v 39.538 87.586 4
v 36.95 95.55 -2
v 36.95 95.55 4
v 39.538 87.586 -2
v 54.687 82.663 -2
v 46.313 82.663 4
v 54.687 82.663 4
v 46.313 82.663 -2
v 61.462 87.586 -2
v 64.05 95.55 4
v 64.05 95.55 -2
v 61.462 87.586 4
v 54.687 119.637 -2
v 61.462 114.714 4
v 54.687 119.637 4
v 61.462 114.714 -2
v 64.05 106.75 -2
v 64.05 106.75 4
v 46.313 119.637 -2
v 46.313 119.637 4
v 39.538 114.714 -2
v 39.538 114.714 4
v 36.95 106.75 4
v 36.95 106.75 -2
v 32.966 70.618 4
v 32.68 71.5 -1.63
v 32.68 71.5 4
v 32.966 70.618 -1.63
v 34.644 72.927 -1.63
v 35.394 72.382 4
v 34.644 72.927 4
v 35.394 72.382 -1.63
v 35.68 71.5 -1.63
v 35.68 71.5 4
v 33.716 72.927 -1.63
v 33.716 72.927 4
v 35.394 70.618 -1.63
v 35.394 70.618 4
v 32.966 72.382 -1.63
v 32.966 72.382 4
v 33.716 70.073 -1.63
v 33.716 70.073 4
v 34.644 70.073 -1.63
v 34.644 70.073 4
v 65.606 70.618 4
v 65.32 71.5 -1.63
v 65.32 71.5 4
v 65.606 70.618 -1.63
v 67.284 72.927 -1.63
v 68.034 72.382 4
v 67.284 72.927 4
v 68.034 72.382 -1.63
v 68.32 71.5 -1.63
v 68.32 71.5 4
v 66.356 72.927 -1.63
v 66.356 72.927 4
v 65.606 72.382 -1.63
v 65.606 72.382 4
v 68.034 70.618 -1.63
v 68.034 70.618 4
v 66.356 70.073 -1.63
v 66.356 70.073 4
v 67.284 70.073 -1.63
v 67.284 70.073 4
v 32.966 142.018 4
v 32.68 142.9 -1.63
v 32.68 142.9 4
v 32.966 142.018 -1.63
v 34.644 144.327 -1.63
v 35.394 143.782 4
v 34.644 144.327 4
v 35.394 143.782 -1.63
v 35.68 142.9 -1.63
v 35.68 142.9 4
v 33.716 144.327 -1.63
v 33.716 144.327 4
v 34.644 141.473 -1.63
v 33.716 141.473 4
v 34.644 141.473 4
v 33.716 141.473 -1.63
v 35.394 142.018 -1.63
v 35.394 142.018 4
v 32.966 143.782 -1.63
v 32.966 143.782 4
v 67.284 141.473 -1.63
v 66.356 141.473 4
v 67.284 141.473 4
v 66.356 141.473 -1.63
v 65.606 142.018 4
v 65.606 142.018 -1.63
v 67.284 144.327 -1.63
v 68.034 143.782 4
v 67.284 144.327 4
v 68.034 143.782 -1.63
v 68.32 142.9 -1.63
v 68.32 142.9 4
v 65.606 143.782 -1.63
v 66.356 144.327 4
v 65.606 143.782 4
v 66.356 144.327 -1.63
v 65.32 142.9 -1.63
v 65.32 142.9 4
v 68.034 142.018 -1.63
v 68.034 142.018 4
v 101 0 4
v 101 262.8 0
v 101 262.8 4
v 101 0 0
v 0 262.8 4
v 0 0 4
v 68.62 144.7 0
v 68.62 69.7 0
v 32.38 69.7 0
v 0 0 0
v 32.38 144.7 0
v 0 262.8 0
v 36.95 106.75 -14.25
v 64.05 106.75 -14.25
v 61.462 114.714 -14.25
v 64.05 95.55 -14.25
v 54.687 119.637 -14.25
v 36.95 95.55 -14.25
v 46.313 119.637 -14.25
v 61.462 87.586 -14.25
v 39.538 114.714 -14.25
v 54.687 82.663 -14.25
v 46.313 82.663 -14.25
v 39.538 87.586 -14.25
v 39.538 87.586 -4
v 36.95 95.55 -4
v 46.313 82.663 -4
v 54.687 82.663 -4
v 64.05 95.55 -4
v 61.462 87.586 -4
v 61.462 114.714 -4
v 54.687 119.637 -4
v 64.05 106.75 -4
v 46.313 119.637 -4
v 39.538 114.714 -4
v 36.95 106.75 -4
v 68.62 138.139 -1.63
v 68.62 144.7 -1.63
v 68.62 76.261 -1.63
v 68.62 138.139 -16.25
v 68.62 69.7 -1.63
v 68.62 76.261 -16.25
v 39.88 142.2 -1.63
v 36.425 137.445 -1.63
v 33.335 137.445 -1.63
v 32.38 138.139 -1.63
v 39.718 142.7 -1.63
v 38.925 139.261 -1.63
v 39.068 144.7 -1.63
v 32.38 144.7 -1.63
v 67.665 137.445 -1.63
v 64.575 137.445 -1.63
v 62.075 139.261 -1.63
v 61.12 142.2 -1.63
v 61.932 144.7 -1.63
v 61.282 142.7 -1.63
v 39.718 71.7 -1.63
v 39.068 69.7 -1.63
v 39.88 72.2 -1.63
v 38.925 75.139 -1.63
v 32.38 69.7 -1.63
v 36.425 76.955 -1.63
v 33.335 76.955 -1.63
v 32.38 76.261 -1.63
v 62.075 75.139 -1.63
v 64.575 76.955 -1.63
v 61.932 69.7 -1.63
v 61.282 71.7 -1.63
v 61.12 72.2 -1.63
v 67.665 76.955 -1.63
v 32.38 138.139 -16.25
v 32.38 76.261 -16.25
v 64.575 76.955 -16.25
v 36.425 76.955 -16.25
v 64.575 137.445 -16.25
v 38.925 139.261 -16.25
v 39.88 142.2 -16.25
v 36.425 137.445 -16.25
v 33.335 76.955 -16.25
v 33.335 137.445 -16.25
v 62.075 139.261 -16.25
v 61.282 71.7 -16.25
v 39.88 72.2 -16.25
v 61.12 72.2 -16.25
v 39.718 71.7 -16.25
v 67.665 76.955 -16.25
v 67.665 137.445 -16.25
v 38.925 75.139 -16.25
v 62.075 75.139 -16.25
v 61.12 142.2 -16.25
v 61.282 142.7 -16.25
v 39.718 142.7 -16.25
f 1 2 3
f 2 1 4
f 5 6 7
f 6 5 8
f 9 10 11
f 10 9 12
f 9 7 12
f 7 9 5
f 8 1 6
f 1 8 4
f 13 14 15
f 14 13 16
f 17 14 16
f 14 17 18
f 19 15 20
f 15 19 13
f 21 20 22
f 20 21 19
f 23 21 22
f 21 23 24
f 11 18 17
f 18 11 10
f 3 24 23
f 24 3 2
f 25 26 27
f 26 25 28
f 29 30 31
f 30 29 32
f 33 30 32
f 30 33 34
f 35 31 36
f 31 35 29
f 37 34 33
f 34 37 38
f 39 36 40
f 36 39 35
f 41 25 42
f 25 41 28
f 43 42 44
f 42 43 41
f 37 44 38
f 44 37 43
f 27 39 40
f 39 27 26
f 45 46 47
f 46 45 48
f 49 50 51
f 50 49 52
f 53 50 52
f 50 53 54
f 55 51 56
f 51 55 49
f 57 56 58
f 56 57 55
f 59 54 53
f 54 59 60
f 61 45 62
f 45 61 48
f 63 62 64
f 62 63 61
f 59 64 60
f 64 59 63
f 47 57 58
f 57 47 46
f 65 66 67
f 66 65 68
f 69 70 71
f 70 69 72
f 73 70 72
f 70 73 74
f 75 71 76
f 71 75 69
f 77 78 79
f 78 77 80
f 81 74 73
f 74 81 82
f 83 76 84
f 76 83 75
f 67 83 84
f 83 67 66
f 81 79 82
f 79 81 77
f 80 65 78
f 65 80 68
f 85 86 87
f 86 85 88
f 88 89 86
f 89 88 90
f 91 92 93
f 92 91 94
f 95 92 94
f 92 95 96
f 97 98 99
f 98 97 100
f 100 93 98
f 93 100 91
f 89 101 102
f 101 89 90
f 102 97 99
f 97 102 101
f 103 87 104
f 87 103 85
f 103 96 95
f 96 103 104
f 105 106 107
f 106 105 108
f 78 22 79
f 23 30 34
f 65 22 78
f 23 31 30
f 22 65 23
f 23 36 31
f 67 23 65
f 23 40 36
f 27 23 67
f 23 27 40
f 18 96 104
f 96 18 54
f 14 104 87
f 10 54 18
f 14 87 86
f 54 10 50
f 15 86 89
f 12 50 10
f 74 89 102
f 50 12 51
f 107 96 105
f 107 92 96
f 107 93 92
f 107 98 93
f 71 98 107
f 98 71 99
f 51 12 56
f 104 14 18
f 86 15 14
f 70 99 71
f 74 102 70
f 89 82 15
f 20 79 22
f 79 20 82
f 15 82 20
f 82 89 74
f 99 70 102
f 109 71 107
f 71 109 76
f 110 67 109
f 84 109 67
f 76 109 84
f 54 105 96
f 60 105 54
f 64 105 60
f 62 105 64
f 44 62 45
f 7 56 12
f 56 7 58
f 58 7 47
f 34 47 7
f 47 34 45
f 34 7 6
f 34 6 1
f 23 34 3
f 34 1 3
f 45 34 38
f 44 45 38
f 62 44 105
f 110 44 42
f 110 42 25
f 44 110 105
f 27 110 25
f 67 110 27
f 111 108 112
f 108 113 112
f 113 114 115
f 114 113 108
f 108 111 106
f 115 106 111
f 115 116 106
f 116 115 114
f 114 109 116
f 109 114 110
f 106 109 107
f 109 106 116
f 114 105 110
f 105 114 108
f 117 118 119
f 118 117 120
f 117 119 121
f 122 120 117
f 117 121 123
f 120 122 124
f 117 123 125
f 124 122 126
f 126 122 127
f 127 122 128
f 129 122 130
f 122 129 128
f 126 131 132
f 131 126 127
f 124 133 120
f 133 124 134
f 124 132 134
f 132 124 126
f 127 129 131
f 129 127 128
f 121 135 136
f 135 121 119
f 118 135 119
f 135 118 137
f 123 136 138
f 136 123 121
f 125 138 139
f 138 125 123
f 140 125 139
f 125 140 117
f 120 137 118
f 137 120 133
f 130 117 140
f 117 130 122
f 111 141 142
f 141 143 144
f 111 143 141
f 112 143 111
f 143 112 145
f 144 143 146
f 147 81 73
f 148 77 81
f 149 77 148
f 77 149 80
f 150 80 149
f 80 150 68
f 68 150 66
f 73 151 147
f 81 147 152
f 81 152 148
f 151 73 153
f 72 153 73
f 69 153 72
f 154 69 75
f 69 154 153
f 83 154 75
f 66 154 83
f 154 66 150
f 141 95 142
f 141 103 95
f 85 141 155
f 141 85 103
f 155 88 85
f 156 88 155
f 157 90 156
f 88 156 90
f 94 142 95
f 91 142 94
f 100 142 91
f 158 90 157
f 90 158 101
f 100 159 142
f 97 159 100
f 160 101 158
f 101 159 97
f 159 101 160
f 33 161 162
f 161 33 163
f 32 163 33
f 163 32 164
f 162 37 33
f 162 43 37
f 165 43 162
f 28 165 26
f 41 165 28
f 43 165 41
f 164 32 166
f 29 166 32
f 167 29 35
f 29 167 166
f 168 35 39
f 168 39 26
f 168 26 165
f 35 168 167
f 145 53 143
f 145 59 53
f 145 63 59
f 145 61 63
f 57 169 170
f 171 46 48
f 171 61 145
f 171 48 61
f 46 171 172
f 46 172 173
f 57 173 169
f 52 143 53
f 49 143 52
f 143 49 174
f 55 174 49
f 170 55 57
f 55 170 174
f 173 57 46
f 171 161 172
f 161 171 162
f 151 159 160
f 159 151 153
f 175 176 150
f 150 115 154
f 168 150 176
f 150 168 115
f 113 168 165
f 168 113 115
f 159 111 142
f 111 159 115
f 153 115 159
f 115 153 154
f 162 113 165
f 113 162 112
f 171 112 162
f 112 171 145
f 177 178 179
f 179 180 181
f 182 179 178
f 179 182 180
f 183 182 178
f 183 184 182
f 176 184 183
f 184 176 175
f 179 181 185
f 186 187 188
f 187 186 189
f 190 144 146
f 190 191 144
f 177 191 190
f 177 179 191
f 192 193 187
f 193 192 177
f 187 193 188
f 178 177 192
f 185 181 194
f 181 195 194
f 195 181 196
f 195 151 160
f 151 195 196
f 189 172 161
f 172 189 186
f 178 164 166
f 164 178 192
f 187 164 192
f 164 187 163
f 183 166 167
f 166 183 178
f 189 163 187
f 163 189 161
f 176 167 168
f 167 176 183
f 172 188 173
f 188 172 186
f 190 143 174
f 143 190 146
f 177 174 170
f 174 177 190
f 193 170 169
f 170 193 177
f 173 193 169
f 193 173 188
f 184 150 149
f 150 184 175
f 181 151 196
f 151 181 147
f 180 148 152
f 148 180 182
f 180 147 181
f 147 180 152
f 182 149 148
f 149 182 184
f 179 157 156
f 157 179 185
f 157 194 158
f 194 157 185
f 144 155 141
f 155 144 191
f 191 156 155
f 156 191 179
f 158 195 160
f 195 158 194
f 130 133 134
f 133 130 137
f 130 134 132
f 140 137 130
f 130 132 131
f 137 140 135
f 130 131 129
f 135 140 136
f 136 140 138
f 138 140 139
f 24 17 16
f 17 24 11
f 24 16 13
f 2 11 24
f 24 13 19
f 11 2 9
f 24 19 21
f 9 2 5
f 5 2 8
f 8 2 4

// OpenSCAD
// file: logo_ia.scad
// Module names are of the form poly_<inkscape-path-id>().  As a result,
// you can associate a polygon in this OpenSCAD program with the corresponding
// SVG element in the Inkscape document by looking for the XML element with
// the attribute id="inkscape-path-id".

// fudge value is used to ensure that subtracted solids are a tad taller
// in the z dimension than the polygon being subtracted from.  This helps
// keep the resulting .stl file manifold.
fudge = 0.1;

module logo_ia(h) {
	l_ia_poly_path2258(1);
	l_ia_poly_rect2221(1);
	l_ia_poly_path2256(1);
}

module l_ia_poly_path2258(h)
{
  scale([25.4/90, -25.4/90, 1]) union()
  {
    linear_extrude(height=h)
      polygon([[-348.343370,-299.999997],[-429.329816,-151.807228],[47.100903,-151.807228],[48.804186,-155.933918],[50.655575,-159.981314],[52.651679,-163.946025],[54.789107,-167.824659],[57.064467,-171.613824],[59.474369,-175.310131],[62.015420,-178.910187],[64.684229,-182.410601],[67.477406,-185.807982],[70.391557,-189.098939],[73.423293,-192.280080],[76.569221,-195.348015],[79.825951,-198.299352],[83.190090,-201.130700],[86.658248,-203.838668],[90.227032,-206.419864],[93.893053,-208.870898],[97.652917,-211.188377],[101.503235,-213.368912],[105.440613,-215.409109],[109.461662,-217.305580],[113.562990,-219.054931],[117.741204,-220.653773],[121.992915,-222.098713],[126.314730,-223.386361],[130.703258,-224.513324],[135.155107,-225.476213],[139.666887,-226.271636],[144.235206,-226.896202],[148.856672,-227.346518],[153.527894,-227.619195],[158.245481,-227.710841],[162.963070,-227.619199],[167.634295,-227.346524],[172.255764,-226.896210],[176.824084,-226.271647],[181.335866,-225.476225],[185.787717,-224.513338],[190.176246,-223.386375],[194.498061,-222.098728],[198.749772,-220.653788],[202.927987,-219.054947],[207.029315,-217.305596],[211.050363,-215.409125],[214.987742,-213.368927],[218.838059,-211.188392],[222.597923,-208.870912],[226.263942,-206.419878],[229.832726,-203.838681],[233.300883,-201.130712],[236.665021,-198.299363],[239.921749,-195.348025],[243.067677,-192.280089],[246.099411,-189.098946],[249.013562,-185.807988],[251.806737,-182.410606],[254.475545,-178.910191],[257.016595,-175.310134],[259.426496,-171.613827],[261.701856,-167.824660],[263.839283,-163.946026],[265.835387,-159.981315],[267.686776,-155.933918],[269.390058,-151.807228],[429.216864,-151.807228],[348.230419,-299.999997],[-348.343370,-299.999997]]);
  }
}

module l_ia_poly_rect2221(h)
{
  scale([25.4/90, -25.4/90, 1]) union()
  {
    linear_extrude(height=h)
      polygon([[-595.368971,151.807228],[-676.468368,299.999997],[676.468368,299.999997],[595.368971,151.807228],[-595.368971,151.807228]]);
  }
}

module l_ia_poly_path2256(h)
{
  scale([25.4/90, -25.4/90, 1]) union()
  {
    linear_extrude(height=h)
      polygon([[-476.769574,-65.060240],[-557.868971,83.132529],[557.756019,83.132529],[476.769574,-65.060240],[269.390058,-65.060240],[267.686772,-60.933553],[265.835381,-56.886160],[263.839274,-52.921451],[261.701844,-49.042820],[259.426482,-45.253656],[257.016579,-41.557351],[254.475527,-37.957296],[251.806716,-34.456883],[249.013540,-31.059502],[246.099388,-27.768545],[243.067652,-24.587404],[239.921724,-21.519469],[236.664995,-18.568131],[233.300856,-15.736783],[229.832699,-13.028814],[226.263915,-10.447617],[222.597896,-7.996583],[218.838032,-5.679103],[214.987716,-3.498567],[211.050338,-1.458368],[207.029290,0.438103],[202.927964,2.187456],[198.749750,3.786299],[194.498041,5.231240],[190.176227,6.518888],[185.787700,7.645853],[181.335851,8.608743],[176.824072,9.404167],[172.255754,10.028733],[167.634289,10.479050],[162.963067,10.751727],[158.245481,10.843373],[153.527897,10.751724],[148.856678,10.479044],[144.235214,10.028724],[139.666898,9.404156],[135.155119,8.608731],[130.703271,7.645840],[126.314744,6.518874],[121.992930,5.231225],[117.741220,3.786283],[113.563006,2.187440],[109.461678,0.438087],[105.440629,-1.458384],[101.503250,-3.498583],[97.652932,-5.679118],[93.893067,-7.996597],[90.227046,-10.447631],[86.658260,-13.028827],[83.190102,-15.736794],[79.825961,-18.568142],[76.569231,-21.519478],[73.423301,-24.587412],[70.391565,-27.768553],[67.477412,-31.059508],[64.684235,-34.456888],[62.015424,-37.957300],[59.474372,-41.557354],[57.064470,-45.253658],[54.789108,-49.042821],[52.651680,-52.921452],[50.655575,-56.886160],[48.804186,-60.933553],[47.100903,-65.060240],[-476.769574,-65.060240]]);
  }
}

logo_ia(1);
// file: haut_parleur_HP8R.scad
include <parametre.scad>

// pour exporter en .dxf
//projection(cut = false) 
haut_parleur_HP8R();

module haut_parleur_HP8R() {
	union() {
		difference() {
			color([0.7, 0.7, 0.7])
			union() {
				// la plaque de fixation
				cube(size=[HP8R_largeur, HP8R_hauteur, HP8R_epaisseur_tole]);
				// le caisson
				translate([0, (HP8R_hauteur - HP8R_hauteur_caisson) / 2, 0])
					cube(size=[HP8R_largeur, HP8R_hauteur_caisson, HP8R_epaisseur_totale]);
			}
			
			// on fait des trous :)

			// les 4 coins
			translate([HP8R_diametre_creuse_coins / 4, HP8R_diametre_creuse_coins / 4, HP8R_epaisseur_tole])
				cylinder(HP8R_epaisseur_totale + difference_objet_marge, d=HP8R_diametre_creuse_coins, $fn=resolution);
			translate([HP8R_largeur - HP8R_diametre_creuse_coins / 2 + HP8R_diametre_creuse_coins / 4, HP8R_diametre_creuse_coins / 4, HP8R_epaisseur_tole])
				cylinder(HP8R_epaisseur_totale + difference_objet_marge, d=HP8R_diametre_creuse_coins, $fn=resolution);
			translate([HP8R_diametre_creuse_coins / 4, HP8R_hauteur - HP8R_diametre_creuse_coins / 2 + HP8R_diametre_creuse_coins / 4, HP8R_epaisseur_tole])
				cylinder(HP8R_epaisseur_totale + difference_objet_marge, d=HP8R_diametre_creuse_coins, $fn=resolution);
			translate([HP8R_largeur - HP8R_diametre_creuse_coins / 2 + HP8R_diametre_creuse_coins / 4, HP8R_hauteur - HP8R_diametre_creuse_coins / 2 + HP8R_diametre_creuse_coins / 4, HP8R_epaisseur_tole])
				cylinder(HP8R_epaisseur_totale + difference_objet_marge, d=HP8R_diametre_creuse_coins, $fn=resolution);

			haut_parleur_HP8R_trous();
		}
		
		// on ajoute la membrane de l'enceinte
		haut_parleur_HP8R_membrane();
	}
}

module haut_parleur_HP8R_membrane() {
	color([0.5, 0.5, 0.5])
		translate([HP8R_largeur / 2 - HP8R_largeur_trou / 2, HP8R_decalage_hauteur_trou, 2]) 
			cube(size=[HP8R_largeur_trou, HP8R_largeur_trou * 2, 2]);
}

module haut_parleur_HP8R_trouHP() {
	union() {
		// arrondi HP
		translate([HP8R_largeur / 2, HP8R_decalage_hauteur_trou + HP8R_largeur_trou / 2, -difference_objet_marge])
			cylinder(HP8R_epaisseur_trou + difference_objet_marge, d=HP8R_largeur_trou, $fn=resolution);
		translate([HP8R_largeur / 2, HP8R_decalage_hauteur_trou + HP8R_hauteur_trou - HP8R_largeur_trou / 2, -difference_objet_marge])
			cylinder(HP8R_epaisseur_trou + difference_objet_marge, d=HP8R_largeur_trou, $fn=resolution);

		// le trou HP
		translate([(HP8R_largeur - HP8R_largeur_trou) / 2, HP8R_decalage_hauteur_trou + HP8R_largeur_trou / 2, -difference_objet_marge])
				cube(size=[HP8R_largeur_trou, HP8R_hauteur_trou - HP8R_largeur_trou, HP8R_epaisseur_trou + difference_objet_marge]);
	}
}

module haut_parleur_HP8R_trousFixation() {
	// les 4 trous pour fixation
	translate([HP8R_marge_creuse_fixation, HP8R_marge_creuse_fixation, -difference_objet_marge/2])
		cylinder(HP8R_epaisseur_tole + difference_objet_marge, d=HP8R_diametre_creuse_fixation, $fn=resolution);
	translate([HP8R_largeur - HP8R_marge_creuse_fixation, HP8R_marge_creuse_fixation, -difference_objet_marge/2])
		cylinder(HP8R_epaisseur_tole + difference_objet_marge, d=HP8R_diametre_creuse_fixation, $fn=resolution);
	translate([HP8R_marge_creuse_fixation, HP8R_hauteur - HP8R_marge_creuse_fixation, -difference_objet_marge/2])
		cylinder(HP8R_epaisseur_tole + difference_objet_marge, d=HP8R_diametre_creuse_fixation, $fn=resolution);
	translate([HP8R_largeur - HP8R_marge_creuse_fixation, HP8R_hauteur - HP8R_marge_creuse_fixation, -difference_objet_marge/2])
		cylinder(HP8R_epaisseur_tole + difference_objet_marge, d=HP8R_diametre_creuse_fixation, $fn=resolution);
}

module haut_parleur_HP8R_trous() {
	haut_parleur_HP8R_trouHP();
	haut_parleur_HP8R_trousFixation();
}
// file: parametre.scad
/* pour le rendu openscad */

// pour la finesse de rendu
// plus c'est élevé, mieux c'est... mais ça prend plus de temps et de ressource
resolution = 10;

// pour export DXF
show_mode_projection = 0;

// pour enlever de la matière des objets dans openscad et être certain qu'il ne reste pas un bout de face
difference_objet_marge = 20;

// pour afficher (1) ou pas (0) les accessoires installés
show_accessoires = 1;

show_incrustations = 0;

show_logo_r2builders = 0;



/* pour le design du jeu  */

// tout est en millimetre !!!!

// configuration globale
////////////////////////

// quand on perce et que l'on va insérer quelque chose dedans...
// il faut un peu de vide en plus ;)
padding_percage = 0.2;

// espace supplémentaire pour la largeur de rainure
padding_rainure = 0; // 1

// profondeur standard pour une rainure
profondeur_rainure = 0; // 2 // moins que epaisseur_tole_grille_led et que epaisseur_tole_grille_led ! Il faut qu'il reste de la matière !

// définition de base du jeu
nombre_colonnes = 7;
nombre_lignes = 6;


// les boutons de sélection de colonne et du nombre de joueurs
//////////////////////////////////////////////////////////////
diametre_bouton_arcade = 33.3;
rayon_bouton_arcade = diametre_bouton_arcade / 2;
diametre_trou_bouton_arcade = 27.8;
rayon_trou_bouton_arcade = diametre_trou_bouton_arcade / 2;
hauteur_bague_bouton_arcade = 4.7;
hauteur_bouton_arcade = 4.85;
diametre_push_bouton_arcade = diametre_bouton_arcade - 4;
profondeur_interne_bouton_arcade = 33.5;


// bouton EC11
//////////////
diametre_bouton_ec11 = 14.4;
hauteur_bouton_ec11 = 13.1;
epaisseur_trait_ec11 = 1;
trou_axe_ec11 = 7;
espace_platine_bouton = 10.7;
hauteur_platine_ec11 = 33.4;
largeur_platine_ec11 = 27.5;
epaisseur_platine_ec11 = 1.3;
trou_fixation_ec11 = 3;
trou_marge_ec11 = 2.40;


// haut-parleur HP8R
////////////////////
HP8R_epaisseur_totale = 16.25;
HP8R_largeur = 36.24;
HP8R_hauteur = 75;
HP8R_epaisseur_tole = 1.63;
HP8R_hauteur_caisson = 71;
//HP8R_epaisseur_caisson = 16.25 - HP8R_epaisseur_tole;
HP8R_decalage_hauteur_trou = 12.3;
HP8R_largeur_trou = 27.1;
HP8R_hauteur_trou = 38.3;
HP8R_epaisseur_trou = HP8R_epaisseur_totale - 2;
HP8R_diametre_creuse_coins = 10;
HP8R_diametre_creuse_fixation = 3;
HP8R_marge_creuse_fixation = 1.6 + padding_percage;


// Embase alimentation
//////////////////////
embase_decallage = 3.3;
embase_externe_largeur = 8.95;
embase_externe_hauteur = 10.7;
embase_externe_profondeur = 3.5;
embase_externe_marge_trou = 3.3;
embase_externe_diametre_trou = 6.4;
embase_externe_diametre_pin = 1.6;
embase_interne_profondeur = 10.6;
embase_platine_profondeur = 25.5;
embase_platine_decallage = 5.6;
embase_platine_largeur = 25.9;
embase_platine_epaisseur = 1.6;
embase_marge_fixation = 1.5;
embase_diametre_fixation = 3;


// led type1 : LED étanche avec électronique carré
////////////
profondeur_chapeau_led = 7.5;
diametre_trou_led = 9;
diametre_interne_led = 9;
profondeur_interne_led = 0;
boitier_largeur_led = 17.2;
boitier_hauteur_led = 11.2;
boitier_epaisseur_led = 5;


// cadrillage autour des LEDs
/////////////////////////////
profondeur_separateur_led = 15; // TODO: à valider !


// pour stocker les cables et l'électronique
////////////////////////////////////////////
espace_vide_milieu = 40; // TODO: à valider !   vérifier qu'il n'y a pas de conflit entre bouton et led en haut !!!


// le mur Star Wars fenetré
///////////////////////////
epaisseur_tole_mur = 4;
taille_fenetre = diametre_bouton_arcade; // valeur à fixer si bouton plus petit, ici je m'adapte à cette taille de bouton
ecart_entre_fenetre = 5; // au jugé ;)
marge_mur = 15; // pour aérer le tour   10 => haut parleur touche led et conflit bouton dans le coin !

// on peut maintenant calculer la surface du jeu !
largeur_mur = marge_mur + (nombre_colonnes * taille_fenetre) + ((nombre_colonnes - 1) * ecart_entre_fenetre) + marge_mur;
hauteur_mur = marge_mur + (nombre_lignes * taille_fenetre) + ((nombre_lignes - 1) * ecart_entre_fenetre) + marge_mur;
echo(str("** PLAQUE MUR (x2) : ", largeur_mur , " x ", hauteur_mur, " x ", epaisseur_tole_mur));


// la grille de LEDS
////////////////////
epaisseur_tole_grille_led = 4;
largeur_rainure_grille_led = epaisseur_tole_grille_led + padding_rainure;
profondeur_rainure_grille_led = profondeur_rainure; // moins que epaisseur_tole_grille_led !!!
echo(str("** PLAQUE GRILLE LED (x2) : ", largeur_mur , " x ", hauteur_mur, " x ", epaisseur_tole_grille_led));


// le plexi blanc derrière le mur, pour faire les fenêtres
//////////////////////////////////////////////////////////
epaisseur_plexi_blanc = 2.5;
transparence_plexi = 1;
echo(str("** PLAQUE PLEXI BLANC (x2) : ", largeur_mur , " x ", hauteur_mur, " x ", epaisseur_plexi_blanc));


// calcul de l'épaisseur complète du jeu
epaisseur_jeu = espace_vide_milieu + 2 * epaisseur_tole_mur + 2 * epaisseur_plexi_blanc + 2 * epaisseur_tole_grille_led + 2 * profondeur_separateur_led;


// la plaque du dessus avec les boutons de choix de colonne
///////////////////////////////////////////////////////////
epaisseur_tole_dessus = 4; // ce "chapeau" sera rainurée pour tenir les plaques !
debord_rainure = 5; // qui dépasse de devant et derrière 
profondeur_dessus = epaisseur_jeu + 2 * debord_rainure;
marge_largeur_dessus = (largeur_mur - (nombre_colonnes * diametre_bouton_arcade) - ((nombre_colonnes - 1) * ecart_entre_fenetre)) / 2;
largeur_rainure_mur_plexi = epaisseur_tole_mur + epaisseur_plexi_blanc + padding_rainure;
profondeur_rainure_mur_plexi = profondeur_rainure; // moins que epaisseur_tole_dessus !!!
echo(str("** PLAQUE DESSUS : ", largeur_mur , " x ", profondeur_dessus, " x ", epaisseur_tole_dessus));


// la plaque de dessous
///////////////////////
epaisseur_tole_dessous = 4; // ce socle sera rainurée pour tenir les plaques !
dessous_debord_rainure = 50;
profondeur_dessous = epaisseur_jeu + 2 * dessous_debord_rainure;
echo(str("** PLAQUE SOCLE : ", largeur_mur , " x ", profondeur_dessous, " x ", epaisseur_tole_dessous));


hauteur_cote = epaisseur_tole_dessous + hauteur_mur + epaisseur_tole_dessus - 2 * profondeur_rainure_grille_led;
largeur_cote = profondeur_dessus;


// côté gauche
//////////////
epaisseur_tole_gauche = 4;
echo(str("** PLAQUE COTE GAUCHE : ", largeur_cote , " x ", hauteur_cote, " x ", epaisseur_tole_gauche));


// côté droit
/////////////
epaisseur_tole_droit = 4;
position_ec11 = epaisseur_tole_dessous + embase_platine_epaisseur + embase_externe_hauteur + 15 + hauteur_platine_ec11 / 2; // 15 = taille d'une pinouille arduino connectée sur l'embase
echo(str("** PLAQUE COTE DROIT : ", largeur_cote , " x ", hauteur_cote, " x ", epaisseur_tole_droit));

position_haut_parleur_HP8R = position_ec11 + hauteur_platine_ec11 / 2 + 5;
// main file
include <parametre.scad>
use <haut_parleur_HP8R.scad>

use <logo_ia.scad>

// pour exporter en .dxf
if(show_mode_projection == 1)
	projection(cut = false) cote_gauche();

if(show_mode_projection == 0)
	cote_gauche();
	

// plaque mur déco
module cote_gauche() {
    color("Silver") {
        difference() {
			
			// une belle dalle
			cube(size=[largeur_cote, hauteur_cote, epaisseur_tole_gauche]);
					
			
			// trou haut-parleur
			translate([(largeur_cote - HP8R_largeur) / 2, position_haut_parleur_HP8R, 0])
				haut_parleur_HP8R_trous();
			
			
			// Dessin gravé
			if(show_incrustations == 1)
			translate([0, 0, 0]) {
			
				translate([largeur_cote / 2, hauteur_cote - 30, epaisseur_tole_gauche - 1 + padding_percage])
					scale([0.2, 0.2, 1])
						logo_ia(2);

				width = 27;
				translate([width / 2, hauteur_cote - 61, epaisseur_tole_gauche - 2 + padding_percage]) {
					difference() {
						cube(size=[largeur_cote - width, 10, 2]);
						
						translate([0.5, 3, 0])
							linear_extrude(height = 2 + padding_percage)
								text("Industrial Automaton", halign = "left", size = 3.1, font = "Aurabesh");
					}
				}
				
				// Fourth
				translate([largeur_cote / 2, 37, epaisseur_tole_gauche - 2 + padding_percage])
					linear_extrude(height = 2 + padding_percage)
						text("Fourth", halign = "center", size = 9, font = "Aurabesh");
				// in-a-row
				translate([largeur_cote / 2, 22, epaisseur_tole_gauche - 2 + padding_percage])
					linear_extrude(height = 2 + padding_percage)
						text("in-a-row", halign = "center", size = 9, font = "Aurabesh");

			}
			
		}
	
		if(show_accessoires == 1) {
		
		translate([(largeur_cote - HP8R_largeur) / 2, position_haut_parleur_HP8R, 0])
				mirror([0, 0, 1])
					haut_parleur_HP8R();
		}

	}
}
